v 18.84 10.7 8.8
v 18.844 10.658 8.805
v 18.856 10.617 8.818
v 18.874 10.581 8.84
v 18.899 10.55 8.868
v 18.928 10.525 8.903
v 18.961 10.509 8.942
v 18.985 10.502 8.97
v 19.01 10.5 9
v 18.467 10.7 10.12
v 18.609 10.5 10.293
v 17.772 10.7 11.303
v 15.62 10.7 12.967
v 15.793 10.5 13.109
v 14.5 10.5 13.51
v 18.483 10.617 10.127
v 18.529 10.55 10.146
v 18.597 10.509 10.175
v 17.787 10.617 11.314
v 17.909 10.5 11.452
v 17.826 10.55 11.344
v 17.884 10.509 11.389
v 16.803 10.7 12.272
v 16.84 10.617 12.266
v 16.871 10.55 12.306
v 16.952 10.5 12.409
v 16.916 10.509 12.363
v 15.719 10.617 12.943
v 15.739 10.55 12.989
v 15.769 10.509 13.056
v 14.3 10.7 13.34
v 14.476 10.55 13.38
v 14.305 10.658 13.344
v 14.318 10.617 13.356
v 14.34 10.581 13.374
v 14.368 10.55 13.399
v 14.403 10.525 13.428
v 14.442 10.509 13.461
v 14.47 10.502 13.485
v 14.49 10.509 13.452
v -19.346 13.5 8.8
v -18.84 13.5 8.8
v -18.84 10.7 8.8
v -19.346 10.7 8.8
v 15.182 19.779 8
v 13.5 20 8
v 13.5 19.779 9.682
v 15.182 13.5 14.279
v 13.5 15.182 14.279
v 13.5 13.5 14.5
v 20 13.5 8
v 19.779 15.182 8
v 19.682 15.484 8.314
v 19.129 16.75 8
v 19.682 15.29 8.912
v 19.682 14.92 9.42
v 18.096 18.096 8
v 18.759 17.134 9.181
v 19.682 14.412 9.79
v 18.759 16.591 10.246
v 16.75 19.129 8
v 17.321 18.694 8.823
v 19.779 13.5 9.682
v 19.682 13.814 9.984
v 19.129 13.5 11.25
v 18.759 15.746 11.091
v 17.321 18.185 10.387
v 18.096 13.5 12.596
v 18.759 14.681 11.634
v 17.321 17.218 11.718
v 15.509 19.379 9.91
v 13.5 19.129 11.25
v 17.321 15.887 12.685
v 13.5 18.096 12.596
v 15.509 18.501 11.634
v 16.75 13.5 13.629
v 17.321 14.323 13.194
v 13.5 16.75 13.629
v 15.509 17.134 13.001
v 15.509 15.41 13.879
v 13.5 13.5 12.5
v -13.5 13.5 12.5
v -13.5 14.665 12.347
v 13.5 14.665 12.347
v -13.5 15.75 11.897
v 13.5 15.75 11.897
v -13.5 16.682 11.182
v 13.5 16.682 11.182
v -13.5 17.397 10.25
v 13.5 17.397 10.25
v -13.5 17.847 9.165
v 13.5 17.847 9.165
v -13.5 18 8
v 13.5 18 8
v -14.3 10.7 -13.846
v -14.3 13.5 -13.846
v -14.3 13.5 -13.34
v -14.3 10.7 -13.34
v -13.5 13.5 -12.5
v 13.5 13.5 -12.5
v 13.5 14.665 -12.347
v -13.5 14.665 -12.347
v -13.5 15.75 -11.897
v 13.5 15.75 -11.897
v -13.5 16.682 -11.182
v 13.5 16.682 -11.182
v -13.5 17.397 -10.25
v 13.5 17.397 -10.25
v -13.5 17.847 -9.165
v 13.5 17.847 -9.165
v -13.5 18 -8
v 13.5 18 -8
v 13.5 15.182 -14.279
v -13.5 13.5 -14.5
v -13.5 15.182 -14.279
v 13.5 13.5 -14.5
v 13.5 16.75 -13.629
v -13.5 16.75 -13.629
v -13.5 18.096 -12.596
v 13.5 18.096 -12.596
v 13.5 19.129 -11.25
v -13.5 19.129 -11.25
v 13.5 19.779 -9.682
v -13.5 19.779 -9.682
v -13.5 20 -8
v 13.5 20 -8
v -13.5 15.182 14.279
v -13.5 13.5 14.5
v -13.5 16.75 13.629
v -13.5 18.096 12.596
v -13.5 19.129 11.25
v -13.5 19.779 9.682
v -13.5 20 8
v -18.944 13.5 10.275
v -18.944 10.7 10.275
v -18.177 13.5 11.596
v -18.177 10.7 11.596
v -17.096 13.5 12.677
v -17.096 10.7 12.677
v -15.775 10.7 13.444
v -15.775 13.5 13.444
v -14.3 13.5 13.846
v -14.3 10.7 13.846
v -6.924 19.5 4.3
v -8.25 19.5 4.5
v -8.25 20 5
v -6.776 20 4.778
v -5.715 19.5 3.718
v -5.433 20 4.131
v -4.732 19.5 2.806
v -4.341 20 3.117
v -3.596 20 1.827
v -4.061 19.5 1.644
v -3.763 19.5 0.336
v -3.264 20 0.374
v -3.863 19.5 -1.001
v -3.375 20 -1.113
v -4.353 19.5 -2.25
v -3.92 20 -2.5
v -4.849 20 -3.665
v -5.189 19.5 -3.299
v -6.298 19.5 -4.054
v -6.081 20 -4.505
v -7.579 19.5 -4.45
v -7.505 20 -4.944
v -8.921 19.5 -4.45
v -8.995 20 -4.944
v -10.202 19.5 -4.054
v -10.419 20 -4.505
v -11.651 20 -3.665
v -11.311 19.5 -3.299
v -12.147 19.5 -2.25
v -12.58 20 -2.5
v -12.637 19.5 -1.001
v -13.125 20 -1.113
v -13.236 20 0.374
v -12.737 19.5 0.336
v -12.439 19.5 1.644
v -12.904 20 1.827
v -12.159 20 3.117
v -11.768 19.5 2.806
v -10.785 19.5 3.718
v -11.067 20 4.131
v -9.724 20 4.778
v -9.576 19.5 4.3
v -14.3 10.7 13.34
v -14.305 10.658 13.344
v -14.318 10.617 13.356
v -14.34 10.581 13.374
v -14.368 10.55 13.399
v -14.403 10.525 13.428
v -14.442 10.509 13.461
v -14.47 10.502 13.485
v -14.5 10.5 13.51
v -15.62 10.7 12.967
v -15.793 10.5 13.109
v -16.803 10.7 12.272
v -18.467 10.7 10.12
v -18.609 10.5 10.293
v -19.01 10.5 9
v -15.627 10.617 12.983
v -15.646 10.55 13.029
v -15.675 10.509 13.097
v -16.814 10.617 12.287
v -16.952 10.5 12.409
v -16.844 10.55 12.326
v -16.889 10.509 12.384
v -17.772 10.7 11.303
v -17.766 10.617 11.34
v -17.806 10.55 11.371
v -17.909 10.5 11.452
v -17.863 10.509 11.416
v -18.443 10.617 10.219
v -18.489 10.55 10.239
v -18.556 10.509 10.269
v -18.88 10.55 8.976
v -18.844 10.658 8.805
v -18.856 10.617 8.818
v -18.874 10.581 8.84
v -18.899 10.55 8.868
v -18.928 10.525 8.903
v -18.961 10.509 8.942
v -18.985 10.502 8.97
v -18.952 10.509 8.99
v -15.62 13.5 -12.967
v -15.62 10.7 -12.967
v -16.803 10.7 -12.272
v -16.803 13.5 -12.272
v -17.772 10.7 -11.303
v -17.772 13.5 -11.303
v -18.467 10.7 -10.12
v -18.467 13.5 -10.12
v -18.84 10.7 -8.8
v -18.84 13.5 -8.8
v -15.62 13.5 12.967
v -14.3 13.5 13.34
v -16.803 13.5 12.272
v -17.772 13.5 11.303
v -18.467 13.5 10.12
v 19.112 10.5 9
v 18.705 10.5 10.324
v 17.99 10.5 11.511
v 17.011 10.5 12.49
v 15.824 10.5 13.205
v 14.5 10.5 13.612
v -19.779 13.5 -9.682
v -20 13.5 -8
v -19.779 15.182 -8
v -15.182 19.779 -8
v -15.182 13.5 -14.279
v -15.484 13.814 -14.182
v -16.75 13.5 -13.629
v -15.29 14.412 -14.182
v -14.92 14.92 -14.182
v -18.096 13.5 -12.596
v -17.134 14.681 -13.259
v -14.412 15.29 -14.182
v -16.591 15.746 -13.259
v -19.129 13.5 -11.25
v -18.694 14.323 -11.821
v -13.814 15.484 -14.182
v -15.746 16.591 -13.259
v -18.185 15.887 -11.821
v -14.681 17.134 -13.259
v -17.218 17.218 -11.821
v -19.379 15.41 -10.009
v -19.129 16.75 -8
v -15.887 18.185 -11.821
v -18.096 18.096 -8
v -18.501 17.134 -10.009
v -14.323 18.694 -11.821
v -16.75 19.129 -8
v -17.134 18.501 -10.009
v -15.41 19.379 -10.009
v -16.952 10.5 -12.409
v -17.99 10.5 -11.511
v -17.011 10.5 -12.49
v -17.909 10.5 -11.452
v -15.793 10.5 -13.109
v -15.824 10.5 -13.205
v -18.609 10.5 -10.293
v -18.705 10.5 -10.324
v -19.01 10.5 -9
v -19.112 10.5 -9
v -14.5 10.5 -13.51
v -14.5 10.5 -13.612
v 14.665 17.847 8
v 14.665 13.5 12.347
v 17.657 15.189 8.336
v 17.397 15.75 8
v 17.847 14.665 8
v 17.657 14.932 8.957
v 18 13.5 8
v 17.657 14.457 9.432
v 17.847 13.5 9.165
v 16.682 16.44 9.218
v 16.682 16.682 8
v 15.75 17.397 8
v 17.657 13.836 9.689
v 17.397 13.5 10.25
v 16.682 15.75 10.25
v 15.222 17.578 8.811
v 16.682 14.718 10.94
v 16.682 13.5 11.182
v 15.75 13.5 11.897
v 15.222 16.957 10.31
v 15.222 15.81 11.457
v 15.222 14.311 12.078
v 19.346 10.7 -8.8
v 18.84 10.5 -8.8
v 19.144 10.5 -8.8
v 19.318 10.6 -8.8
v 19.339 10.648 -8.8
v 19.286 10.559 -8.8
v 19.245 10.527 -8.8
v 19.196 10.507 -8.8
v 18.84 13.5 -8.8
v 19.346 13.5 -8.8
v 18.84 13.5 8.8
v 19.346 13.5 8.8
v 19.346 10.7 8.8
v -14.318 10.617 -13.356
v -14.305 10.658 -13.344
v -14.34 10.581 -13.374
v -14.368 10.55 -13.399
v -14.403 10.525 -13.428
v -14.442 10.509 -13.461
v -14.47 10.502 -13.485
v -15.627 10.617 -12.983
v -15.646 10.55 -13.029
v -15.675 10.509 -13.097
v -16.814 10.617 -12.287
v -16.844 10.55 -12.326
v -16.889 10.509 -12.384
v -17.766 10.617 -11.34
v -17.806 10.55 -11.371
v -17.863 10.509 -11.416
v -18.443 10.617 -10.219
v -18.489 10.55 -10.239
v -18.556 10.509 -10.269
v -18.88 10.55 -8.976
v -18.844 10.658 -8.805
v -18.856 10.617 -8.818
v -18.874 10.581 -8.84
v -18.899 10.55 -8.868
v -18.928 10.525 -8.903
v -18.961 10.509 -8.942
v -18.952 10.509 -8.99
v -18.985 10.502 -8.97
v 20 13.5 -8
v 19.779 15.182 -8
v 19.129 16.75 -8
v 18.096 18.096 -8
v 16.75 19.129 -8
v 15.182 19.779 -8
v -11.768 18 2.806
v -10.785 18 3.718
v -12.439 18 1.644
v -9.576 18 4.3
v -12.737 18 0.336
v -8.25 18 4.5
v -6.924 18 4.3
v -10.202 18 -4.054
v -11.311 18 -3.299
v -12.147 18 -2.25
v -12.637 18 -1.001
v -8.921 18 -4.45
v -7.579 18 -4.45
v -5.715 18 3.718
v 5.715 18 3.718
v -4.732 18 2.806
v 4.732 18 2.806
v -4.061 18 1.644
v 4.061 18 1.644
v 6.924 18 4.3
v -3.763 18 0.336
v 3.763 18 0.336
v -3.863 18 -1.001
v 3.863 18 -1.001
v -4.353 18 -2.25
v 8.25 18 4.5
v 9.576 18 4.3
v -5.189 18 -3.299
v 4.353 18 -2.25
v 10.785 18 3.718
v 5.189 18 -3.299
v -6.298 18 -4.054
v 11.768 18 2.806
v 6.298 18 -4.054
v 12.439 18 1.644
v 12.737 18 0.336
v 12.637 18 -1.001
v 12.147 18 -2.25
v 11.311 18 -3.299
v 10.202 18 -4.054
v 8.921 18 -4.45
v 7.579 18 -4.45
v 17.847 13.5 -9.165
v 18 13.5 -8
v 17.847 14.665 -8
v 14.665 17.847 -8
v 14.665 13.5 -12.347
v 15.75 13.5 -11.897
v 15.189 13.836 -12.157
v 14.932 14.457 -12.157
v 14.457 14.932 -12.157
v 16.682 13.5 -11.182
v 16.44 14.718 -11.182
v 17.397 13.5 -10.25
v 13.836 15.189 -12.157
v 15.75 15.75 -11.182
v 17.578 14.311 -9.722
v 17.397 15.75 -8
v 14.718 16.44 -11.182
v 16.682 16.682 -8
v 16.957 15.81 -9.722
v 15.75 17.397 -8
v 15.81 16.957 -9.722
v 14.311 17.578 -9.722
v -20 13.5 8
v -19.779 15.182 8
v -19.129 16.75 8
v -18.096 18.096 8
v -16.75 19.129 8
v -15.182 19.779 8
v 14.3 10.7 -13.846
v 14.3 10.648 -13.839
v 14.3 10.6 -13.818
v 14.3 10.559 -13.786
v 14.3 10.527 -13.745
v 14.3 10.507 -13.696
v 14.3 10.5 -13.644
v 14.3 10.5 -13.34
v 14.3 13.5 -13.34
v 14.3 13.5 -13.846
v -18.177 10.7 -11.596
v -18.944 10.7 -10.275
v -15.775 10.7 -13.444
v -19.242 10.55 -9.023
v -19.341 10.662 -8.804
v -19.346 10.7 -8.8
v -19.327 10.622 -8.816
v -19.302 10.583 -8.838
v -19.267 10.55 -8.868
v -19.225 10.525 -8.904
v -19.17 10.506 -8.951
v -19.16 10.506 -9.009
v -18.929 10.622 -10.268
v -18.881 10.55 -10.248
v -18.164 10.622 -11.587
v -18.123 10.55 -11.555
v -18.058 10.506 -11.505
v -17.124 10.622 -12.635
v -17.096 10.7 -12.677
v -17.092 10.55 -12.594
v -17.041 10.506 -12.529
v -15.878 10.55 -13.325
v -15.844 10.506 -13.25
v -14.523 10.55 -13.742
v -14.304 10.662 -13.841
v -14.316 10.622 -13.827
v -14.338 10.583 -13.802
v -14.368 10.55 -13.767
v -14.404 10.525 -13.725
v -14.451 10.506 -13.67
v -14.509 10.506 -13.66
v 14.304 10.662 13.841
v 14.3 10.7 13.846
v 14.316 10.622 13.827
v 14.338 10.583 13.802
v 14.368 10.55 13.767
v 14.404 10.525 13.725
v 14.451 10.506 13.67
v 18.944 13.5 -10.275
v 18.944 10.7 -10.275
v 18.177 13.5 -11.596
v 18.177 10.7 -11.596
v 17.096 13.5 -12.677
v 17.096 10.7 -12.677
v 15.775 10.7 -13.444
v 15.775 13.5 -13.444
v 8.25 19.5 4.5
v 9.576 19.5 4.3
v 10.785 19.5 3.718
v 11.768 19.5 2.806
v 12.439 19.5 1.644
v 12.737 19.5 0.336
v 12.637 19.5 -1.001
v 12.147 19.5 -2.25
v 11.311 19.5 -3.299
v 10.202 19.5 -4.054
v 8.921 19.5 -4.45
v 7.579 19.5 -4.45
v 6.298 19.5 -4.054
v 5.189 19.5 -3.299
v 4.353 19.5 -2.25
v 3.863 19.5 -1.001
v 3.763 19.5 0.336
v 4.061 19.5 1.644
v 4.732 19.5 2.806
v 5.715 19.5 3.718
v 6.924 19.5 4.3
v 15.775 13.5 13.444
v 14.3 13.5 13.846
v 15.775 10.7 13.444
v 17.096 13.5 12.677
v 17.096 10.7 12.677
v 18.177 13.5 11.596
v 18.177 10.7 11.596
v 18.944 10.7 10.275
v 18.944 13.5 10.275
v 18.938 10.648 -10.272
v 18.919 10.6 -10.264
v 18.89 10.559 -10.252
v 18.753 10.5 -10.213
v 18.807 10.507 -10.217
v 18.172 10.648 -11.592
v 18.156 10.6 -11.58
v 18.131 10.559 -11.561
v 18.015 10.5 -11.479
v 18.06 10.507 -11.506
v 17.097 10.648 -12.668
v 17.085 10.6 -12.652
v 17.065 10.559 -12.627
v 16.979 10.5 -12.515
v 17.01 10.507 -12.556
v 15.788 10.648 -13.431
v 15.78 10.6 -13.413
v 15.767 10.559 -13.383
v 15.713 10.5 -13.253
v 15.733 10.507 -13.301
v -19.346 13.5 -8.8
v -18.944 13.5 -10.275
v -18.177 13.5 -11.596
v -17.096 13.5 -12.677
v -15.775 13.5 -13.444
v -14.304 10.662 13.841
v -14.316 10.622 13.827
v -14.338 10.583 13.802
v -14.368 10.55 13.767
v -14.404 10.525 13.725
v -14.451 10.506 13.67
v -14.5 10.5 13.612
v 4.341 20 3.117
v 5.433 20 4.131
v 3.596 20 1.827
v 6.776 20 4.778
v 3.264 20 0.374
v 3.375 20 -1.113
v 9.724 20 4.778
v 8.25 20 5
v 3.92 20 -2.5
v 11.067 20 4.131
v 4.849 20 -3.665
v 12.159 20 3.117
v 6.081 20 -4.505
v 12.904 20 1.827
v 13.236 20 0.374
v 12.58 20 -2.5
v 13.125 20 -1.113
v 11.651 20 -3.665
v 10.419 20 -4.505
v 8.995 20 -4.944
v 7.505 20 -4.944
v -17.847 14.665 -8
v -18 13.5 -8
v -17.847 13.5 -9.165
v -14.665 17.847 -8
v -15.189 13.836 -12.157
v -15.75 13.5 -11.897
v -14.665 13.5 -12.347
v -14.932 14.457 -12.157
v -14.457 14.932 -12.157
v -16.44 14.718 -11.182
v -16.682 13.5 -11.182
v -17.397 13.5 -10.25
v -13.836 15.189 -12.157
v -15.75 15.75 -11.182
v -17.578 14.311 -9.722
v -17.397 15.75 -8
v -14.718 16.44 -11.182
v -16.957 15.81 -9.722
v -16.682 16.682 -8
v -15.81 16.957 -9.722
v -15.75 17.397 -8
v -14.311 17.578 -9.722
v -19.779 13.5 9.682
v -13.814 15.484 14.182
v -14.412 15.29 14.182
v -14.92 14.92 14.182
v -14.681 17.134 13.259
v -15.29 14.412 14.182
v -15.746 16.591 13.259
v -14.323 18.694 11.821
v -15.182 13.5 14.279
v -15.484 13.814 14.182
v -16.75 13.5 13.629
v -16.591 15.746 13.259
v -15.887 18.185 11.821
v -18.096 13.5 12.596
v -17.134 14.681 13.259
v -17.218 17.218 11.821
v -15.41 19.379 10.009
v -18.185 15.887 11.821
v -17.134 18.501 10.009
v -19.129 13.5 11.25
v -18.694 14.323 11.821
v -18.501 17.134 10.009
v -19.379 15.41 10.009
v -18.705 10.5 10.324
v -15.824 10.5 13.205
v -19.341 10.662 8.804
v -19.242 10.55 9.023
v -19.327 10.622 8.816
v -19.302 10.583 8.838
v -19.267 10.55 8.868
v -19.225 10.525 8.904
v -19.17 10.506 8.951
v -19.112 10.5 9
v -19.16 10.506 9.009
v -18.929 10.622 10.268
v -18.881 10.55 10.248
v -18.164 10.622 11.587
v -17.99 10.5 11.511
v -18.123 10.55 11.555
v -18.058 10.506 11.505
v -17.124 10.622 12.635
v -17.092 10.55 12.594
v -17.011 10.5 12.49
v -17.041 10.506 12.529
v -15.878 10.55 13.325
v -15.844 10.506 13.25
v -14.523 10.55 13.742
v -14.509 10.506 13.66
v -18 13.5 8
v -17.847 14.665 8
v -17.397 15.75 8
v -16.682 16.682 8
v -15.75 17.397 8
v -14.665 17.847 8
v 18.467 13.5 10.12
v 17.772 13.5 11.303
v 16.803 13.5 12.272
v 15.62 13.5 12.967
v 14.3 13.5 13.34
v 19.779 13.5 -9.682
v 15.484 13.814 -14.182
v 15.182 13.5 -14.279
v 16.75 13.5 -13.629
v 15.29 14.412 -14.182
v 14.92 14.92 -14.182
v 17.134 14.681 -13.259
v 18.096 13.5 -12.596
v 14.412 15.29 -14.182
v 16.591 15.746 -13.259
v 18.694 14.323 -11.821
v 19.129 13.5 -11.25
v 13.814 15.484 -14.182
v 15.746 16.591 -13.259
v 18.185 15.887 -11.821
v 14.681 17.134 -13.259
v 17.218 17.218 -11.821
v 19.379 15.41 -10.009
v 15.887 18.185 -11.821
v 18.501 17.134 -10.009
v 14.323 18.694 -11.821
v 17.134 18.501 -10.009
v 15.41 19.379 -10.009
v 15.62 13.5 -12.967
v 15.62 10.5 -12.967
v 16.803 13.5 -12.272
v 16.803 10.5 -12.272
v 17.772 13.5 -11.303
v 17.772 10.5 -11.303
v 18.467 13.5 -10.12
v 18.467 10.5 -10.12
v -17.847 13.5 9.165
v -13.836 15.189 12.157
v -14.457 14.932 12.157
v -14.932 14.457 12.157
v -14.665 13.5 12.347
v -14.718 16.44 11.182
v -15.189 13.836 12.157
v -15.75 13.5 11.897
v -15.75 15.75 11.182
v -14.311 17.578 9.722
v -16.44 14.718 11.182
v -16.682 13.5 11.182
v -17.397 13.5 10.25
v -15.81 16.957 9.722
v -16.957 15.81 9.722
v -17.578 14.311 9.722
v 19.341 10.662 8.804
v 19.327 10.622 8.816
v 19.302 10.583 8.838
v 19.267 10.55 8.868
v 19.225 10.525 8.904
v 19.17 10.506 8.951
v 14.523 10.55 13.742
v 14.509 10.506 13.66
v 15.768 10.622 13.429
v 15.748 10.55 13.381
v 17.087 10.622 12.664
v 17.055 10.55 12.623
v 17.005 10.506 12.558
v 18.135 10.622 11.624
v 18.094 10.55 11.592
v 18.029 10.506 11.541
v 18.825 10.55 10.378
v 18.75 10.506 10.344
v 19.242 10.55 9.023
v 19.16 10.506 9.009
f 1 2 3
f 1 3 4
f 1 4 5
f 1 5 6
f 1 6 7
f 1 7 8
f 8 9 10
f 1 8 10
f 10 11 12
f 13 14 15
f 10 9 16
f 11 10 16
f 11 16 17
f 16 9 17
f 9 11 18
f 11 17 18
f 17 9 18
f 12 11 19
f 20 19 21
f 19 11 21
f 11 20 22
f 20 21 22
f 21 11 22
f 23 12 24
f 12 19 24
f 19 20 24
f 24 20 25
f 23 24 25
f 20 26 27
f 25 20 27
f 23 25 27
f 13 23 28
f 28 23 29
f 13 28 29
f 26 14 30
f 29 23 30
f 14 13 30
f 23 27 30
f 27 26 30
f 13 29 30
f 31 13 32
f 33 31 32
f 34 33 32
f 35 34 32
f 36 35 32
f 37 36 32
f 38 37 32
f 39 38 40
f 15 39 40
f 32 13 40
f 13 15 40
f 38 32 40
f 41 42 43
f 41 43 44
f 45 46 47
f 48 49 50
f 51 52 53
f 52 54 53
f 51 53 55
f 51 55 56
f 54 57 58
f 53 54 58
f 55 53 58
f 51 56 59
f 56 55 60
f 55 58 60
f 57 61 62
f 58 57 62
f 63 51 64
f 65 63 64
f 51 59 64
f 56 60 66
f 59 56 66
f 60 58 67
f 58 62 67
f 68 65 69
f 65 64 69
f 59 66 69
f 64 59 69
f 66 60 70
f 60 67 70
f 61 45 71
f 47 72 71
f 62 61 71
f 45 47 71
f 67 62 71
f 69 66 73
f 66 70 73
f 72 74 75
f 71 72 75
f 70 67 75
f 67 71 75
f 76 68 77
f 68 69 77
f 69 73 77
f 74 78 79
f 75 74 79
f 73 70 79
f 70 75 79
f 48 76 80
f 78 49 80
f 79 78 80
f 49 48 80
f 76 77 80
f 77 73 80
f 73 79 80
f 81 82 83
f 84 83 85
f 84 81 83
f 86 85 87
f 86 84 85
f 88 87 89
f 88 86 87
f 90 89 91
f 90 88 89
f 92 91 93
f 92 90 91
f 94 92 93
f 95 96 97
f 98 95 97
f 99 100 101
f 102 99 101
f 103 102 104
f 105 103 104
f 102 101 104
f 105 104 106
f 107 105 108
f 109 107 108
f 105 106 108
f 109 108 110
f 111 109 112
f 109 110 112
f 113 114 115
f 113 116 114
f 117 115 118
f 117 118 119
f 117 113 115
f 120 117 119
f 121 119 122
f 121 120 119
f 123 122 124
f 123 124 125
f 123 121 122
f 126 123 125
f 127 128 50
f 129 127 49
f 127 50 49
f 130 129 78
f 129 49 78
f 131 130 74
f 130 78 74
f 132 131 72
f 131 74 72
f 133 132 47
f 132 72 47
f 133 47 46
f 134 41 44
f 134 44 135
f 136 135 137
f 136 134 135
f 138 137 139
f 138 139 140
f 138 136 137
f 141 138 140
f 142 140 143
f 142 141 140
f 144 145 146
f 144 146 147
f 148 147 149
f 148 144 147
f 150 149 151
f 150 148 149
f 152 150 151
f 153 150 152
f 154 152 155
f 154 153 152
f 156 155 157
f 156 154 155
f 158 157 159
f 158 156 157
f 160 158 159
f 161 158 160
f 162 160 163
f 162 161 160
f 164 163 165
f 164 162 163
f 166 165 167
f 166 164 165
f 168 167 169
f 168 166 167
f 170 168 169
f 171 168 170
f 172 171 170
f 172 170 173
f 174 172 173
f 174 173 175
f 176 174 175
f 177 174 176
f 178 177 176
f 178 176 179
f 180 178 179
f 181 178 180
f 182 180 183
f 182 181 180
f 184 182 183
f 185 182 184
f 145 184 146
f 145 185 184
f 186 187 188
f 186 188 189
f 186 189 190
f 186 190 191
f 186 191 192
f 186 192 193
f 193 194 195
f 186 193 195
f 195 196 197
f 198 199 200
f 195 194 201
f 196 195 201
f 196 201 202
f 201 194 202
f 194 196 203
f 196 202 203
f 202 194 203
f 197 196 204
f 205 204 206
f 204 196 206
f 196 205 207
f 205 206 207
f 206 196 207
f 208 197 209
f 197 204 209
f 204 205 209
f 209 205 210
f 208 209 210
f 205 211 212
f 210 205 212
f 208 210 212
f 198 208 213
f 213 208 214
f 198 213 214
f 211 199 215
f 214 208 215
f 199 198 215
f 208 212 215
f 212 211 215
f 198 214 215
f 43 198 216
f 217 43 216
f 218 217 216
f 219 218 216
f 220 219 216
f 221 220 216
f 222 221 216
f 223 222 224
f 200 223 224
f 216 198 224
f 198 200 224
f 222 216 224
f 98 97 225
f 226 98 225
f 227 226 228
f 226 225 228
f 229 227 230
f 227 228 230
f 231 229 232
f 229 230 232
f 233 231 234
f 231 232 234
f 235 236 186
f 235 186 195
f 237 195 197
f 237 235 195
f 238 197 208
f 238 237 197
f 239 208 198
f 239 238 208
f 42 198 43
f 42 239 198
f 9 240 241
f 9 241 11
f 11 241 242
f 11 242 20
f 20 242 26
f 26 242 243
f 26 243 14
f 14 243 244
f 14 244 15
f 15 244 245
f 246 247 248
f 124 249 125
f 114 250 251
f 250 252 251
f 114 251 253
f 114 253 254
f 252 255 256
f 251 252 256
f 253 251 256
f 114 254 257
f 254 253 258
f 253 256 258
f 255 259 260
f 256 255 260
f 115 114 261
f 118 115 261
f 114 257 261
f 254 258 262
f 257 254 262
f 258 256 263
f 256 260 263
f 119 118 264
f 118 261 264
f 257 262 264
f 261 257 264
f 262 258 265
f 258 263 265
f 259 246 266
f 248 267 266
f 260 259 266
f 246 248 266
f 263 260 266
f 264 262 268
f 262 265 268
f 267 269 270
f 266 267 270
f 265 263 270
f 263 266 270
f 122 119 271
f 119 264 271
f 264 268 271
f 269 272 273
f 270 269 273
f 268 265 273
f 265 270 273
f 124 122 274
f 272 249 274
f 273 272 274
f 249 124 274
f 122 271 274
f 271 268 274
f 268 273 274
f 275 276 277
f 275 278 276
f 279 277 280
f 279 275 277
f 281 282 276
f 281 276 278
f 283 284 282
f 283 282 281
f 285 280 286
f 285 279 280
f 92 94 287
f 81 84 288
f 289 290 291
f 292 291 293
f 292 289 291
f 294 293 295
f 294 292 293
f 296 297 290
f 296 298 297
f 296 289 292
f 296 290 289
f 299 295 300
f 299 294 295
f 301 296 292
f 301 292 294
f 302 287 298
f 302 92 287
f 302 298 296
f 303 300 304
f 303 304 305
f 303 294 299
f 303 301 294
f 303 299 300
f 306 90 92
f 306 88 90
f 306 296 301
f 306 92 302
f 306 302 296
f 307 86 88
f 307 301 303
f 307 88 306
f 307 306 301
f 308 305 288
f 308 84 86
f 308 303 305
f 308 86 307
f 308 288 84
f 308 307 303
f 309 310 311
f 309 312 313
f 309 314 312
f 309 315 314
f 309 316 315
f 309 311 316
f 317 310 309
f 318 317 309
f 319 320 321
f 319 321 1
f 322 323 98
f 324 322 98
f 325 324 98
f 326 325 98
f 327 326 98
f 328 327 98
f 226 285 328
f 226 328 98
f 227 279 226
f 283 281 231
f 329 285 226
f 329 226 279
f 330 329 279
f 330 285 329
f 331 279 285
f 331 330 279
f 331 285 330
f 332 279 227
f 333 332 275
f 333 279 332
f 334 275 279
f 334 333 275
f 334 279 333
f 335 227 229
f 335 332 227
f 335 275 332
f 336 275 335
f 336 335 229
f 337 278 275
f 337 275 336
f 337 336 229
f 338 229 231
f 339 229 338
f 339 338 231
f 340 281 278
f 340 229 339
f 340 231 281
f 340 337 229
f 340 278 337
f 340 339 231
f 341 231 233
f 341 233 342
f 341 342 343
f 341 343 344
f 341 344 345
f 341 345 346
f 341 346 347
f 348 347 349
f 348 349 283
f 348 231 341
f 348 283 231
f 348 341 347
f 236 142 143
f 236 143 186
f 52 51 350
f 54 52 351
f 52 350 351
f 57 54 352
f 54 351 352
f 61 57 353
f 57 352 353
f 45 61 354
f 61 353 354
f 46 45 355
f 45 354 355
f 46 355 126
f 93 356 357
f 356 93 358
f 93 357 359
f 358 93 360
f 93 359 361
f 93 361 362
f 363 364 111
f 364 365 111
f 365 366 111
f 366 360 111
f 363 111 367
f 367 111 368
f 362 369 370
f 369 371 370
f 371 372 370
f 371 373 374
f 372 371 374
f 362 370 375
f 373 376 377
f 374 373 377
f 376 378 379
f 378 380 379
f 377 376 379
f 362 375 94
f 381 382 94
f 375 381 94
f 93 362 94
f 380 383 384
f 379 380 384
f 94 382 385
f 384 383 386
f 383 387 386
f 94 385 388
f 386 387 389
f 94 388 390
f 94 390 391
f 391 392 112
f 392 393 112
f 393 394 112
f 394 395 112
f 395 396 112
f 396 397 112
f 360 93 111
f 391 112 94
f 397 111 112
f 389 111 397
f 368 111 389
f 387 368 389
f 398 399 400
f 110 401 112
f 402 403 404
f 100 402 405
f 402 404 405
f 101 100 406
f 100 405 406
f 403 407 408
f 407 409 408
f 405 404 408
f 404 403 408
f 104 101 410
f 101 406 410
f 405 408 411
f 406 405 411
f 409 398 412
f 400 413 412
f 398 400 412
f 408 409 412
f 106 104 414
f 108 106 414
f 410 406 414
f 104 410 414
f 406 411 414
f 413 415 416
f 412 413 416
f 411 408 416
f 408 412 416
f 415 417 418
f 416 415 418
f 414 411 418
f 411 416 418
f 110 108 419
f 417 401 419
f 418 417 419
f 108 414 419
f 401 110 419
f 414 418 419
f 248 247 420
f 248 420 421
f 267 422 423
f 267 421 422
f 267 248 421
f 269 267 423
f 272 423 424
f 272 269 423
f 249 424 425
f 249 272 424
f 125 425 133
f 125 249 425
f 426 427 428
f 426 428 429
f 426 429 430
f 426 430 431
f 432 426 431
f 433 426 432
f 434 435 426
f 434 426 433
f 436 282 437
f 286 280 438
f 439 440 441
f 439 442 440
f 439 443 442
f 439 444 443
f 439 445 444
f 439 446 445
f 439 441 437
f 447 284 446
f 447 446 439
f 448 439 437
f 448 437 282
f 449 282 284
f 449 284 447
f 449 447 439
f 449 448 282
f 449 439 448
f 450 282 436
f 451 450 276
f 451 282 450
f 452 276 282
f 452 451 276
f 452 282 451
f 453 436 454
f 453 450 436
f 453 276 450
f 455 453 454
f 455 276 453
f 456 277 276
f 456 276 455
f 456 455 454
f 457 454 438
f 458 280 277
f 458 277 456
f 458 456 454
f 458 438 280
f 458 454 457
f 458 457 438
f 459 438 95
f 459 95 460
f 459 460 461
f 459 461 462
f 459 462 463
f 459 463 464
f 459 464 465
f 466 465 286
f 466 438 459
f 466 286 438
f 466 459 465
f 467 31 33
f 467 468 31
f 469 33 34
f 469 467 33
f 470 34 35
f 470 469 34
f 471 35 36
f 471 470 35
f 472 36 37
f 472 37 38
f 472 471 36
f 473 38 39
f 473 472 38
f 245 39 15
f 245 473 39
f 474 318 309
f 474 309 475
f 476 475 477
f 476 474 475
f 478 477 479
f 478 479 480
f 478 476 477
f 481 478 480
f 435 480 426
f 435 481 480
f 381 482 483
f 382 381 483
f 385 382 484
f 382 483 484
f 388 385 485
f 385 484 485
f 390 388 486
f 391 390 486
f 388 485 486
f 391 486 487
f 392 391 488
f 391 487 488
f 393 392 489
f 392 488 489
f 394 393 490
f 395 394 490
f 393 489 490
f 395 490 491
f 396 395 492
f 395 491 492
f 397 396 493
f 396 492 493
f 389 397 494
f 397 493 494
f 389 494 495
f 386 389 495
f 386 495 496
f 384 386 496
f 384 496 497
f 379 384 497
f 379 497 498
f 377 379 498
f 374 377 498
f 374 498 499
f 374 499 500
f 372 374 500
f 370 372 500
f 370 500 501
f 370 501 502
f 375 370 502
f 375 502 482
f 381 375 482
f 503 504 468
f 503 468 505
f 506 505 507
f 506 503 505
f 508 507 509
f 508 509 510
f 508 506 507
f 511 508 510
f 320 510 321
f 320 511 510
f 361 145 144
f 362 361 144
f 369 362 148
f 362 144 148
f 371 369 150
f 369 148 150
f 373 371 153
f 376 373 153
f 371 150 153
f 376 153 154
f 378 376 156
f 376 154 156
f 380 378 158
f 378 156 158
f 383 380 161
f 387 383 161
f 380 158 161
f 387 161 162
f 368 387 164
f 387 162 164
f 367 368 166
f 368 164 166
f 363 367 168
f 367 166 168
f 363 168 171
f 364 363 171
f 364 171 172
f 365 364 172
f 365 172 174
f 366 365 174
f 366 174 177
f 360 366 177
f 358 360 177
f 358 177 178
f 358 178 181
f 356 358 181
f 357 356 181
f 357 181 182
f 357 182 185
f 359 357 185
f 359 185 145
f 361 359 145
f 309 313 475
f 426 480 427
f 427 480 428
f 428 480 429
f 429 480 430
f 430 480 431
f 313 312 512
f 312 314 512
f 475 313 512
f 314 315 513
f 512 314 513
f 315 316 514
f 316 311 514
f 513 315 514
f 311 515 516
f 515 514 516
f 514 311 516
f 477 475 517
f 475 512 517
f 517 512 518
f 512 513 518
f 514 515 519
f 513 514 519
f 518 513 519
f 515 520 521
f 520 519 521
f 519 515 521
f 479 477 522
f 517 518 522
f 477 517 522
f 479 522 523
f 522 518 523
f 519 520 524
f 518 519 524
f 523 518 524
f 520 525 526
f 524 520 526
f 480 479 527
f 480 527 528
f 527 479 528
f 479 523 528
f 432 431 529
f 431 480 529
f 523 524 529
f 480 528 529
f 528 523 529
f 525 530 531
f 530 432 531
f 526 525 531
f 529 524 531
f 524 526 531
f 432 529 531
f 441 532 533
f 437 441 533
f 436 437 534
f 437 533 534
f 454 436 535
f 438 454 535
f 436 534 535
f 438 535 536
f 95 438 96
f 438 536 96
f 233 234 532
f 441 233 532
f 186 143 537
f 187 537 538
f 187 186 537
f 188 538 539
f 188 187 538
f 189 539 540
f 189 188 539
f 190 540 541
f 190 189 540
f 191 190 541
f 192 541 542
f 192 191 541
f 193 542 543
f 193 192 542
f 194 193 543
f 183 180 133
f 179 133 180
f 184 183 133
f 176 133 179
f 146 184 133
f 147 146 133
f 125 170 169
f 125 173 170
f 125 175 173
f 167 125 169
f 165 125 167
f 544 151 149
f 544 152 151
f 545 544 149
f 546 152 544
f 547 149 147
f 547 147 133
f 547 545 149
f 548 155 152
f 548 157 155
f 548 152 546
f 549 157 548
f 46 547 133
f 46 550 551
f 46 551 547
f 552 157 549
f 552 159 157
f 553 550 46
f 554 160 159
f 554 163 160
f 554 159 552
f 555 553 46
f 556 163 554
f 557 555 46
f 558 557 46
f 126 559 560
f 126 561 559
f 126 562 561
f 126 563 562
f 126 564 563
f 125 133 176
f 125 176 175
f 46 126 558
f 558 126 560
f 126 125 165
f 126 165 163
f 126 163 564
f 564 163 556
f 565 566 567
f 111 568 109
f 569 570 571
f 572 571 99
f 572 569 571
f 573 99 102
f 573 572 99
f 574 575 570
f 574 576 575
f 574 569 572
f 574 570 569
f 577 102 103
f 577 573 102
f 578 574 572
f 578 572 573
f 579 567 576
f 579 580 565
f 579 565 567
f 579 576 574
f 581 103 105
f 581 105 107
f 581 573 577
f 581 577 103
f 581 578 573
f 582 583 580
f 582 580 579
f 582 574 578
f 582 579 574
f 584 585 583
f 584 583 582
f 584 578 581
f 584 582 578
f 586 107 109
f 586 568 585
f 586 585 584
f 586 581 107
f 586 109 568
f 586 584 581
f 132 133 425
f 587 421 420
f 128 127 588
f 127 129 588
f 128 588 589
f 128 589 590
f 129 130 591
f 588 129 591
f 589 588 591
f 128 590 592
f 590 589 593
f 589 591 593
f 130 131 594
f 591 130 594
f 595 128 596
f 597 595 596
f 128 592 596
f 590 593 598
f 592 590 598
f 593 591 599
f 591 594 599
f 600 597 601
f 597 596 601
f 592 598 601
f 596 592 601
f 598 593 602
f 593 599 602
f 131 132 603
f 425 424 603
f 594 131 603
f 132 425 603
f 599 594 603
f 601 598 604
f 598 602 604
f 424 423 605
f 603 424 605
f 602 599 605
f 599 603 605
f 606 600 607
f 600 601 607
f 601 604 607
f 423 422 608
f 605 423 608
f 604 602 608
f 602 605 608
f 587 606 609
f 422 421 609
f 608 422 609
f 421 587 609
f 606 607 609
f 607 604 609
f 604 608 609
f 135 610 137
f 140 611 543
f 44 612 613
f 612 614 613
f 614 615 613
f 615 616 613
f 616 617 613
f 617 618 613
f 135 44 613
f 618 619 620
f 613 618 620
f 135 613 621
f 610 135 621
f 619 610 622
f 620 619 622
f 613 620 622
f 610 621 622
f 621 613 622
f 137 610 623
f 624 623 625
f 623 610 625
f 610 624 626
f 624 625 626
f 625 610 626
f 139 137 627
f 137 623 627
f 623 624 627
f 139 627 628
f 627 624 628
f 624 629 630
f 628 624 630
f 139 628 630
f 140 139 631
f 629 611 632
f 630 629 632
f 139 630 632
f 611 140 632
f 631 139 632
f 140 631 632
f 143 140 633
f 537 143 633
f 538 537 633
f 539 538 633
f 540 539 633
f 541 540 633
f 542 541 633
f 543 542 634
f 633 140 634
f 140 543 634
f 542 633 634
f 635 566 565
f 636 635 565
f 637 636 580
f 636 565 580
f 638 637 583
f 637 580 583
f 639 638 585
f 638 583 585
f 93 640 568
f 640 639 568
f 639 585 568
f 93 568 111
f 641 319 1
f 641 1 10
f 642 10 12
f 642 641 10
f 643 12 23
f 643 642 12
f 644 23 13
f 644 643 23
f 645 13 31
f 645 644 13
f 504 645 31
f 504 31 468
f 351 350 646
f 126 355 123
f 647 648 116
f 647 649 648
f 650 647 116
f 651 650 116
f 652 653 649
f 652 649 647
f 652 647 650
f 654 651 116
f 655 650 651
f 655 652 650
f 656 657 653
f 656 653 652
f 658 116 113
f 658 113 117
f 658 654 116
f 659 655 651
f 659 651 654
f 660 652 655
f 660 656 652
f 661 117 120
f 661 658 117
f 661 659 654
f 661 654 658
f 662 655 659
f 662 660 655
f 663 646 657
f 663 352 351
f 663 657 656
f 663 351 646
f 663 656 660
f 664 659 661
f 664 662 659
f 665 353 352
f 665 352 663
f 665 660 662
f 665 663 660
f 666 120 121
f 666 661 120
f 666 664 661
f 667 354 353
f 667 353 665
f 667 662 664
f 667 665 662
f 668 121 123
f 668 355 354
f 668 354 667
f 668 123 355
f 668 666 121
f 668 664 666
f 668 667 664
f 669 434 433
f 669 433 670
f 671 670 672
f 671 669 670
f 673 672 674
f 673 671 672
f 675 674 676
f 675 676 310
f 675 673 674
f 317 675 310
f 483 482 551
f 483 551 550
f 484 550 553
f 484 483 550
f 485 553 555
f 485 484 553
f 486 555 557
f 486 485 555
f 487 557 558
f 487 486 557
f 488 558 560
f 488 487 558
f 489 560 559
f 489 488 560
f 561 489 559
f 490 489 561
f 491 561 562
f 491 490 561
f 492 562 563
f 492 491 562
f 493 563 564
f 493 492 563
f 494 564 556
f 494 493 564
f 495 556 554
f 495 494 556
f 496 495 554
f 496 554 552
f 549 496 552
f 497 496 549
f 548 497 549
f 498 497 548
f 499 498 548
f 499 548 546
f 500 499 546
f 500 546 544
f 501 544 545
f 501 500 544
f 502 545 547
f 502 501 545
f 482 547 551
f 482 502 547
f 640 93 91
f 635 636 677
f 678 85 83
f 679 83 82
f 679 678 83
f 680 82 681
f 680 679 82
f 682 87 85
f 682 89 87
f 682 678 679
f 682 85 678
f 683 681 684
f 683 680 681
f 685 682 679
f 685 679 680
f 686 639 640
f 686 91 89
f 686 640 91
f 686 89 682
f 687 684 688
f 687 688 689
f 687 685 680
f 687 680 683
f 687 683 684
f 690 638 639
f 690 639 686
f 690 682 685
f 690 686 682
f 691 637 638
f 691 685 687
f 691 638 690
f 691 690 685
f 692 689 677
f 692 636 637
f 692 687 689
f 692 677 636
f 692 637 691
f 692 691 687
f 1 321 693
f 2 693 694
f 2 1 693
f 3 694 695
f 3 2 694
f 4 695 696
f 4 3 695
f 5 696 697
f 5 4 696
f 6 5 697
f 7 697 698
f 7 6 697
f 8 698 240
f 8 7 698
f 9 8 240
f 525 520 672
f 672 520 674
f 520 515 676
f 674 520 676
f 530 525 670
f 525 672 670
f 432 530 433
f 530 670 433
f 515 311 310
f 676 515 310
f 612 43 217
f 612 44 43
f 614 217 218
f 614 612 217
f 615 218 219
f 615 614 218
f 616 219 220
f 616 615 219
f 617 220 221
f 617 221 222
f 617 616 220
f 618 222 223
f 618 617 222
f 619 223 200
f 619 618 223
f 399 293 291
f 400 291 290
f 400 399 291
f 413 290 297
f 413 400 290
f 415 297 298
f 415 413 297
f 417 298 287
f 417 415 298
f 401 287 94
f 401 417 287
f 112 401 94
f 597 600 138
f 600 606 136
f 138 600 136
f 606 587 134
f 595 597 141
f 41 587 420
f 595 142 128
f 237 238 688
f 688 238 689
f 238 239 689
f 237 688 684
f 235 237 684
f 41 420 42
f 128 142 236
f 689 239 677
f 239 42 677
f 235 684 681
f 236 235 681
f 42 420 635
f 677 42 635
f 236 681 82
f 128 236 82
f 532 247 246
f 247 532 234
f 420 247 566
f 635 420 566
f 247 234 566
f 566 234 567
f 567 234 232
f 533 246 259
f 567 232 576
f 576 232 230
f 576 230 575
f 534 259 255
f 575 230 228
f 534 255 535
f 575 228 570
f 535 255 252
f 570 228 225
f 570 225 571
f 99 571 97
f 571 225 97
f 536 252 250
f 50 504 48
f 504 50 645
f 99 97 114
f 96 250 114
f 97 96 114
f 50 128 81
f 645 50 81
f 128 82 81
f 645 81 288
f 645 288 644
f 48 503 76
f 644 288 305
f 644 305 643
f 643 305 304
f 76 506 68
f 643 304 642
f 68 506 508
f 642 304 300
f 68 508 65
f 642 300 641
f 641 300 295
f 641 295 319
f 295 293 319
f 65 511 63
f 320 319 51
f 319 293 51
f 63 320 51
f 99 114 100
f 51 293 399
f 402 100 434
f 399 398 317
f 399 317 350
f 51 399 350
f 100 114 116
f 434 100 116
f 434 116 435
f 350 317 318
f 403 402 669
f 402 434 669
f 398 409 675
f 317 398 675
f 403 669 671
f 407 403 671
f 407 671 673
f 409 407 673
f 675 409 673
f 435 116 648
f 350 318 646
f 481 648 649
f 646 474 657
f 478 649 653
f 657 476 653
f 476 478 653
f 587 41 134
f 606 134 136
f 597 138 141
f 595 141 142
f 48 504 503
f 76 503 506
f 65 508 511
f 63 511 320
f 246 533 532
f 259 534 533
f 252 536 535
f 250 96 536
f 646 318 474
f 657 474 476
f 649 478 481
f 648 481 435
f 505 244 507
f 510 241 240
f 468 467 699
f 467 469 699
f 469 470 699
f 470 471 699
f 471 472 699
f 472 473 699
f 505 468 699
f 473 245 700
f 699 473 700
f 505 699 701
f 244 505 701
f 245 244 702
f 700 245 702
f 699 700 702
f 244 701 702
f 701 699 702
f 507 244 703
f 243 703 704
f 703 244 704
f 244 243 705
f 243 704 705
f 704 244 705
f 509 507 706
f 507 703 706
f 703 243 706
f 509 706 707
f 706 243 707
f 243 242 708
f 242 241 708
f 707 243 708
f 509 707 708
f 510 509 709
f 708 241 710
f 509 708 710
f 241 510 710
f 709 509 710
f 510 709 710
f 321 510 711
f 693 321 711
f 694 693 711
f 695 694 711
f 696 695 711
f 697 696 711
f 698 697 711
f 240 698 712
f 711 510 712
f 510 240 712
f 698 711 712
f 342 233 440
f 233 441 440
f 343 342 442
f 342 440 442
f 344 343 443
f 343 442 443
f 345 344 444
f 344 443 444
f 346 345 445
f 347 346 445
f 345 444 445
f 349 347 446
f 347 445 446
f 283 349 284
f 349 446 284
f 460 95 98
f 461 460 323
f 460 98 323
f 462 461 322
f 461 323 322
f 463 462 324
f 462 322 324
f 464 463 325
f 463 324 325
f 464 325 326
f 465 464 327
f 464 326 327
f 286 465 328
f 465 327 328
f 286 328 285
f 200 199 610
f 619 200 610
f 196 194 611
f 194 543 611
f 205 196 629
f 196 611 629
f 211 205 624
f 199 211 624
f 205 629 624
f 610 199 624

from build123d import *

# Parameters (mm, degrees)
SKETCH1_W           = 40
SKETCH1_H           = 29
BOSS_EXTRUDE1_DEPTH = 20
FILLET2_R           = 6.5
SKETCH3_W           = 48.982601016
SKETCH3_H           = 39.309165856
CUT_EXTRUDE1_DEPTH  = 14.5
SHELL1_T            = -2
BOSS_EXTRUDE3_DEPTH = 3
FILLET3_R           = 0.2
SKETCH6_R           = 4.5
CUT_EXTRUDE2_DEPTH  = 10.5000001
CHAMFER1_SIZE       = 0.5


with BuildPart() as part:
    # Sketch1 → Boss-Extrude1 (new body)
    with BuildSketch(Plane(origin=(0, 0, 0), x_dir=(1, 0, 0), z_dir=(0, 1, 0))):
        Rectangle(SKETCH1_W, SKETCH1_H)
    extrude(amount=BOSS_EXTRUDE1_DEPTH)

    # Fillet2
    fillet2_edges = [part.edges().sort_by_distance(p)[0] for p in [
        (-20, 20, 0),
        (0, 20, 14.5),
        (20, 20, 0),
        (0, 0, 14.5),
        (-20, 0, 0),
        (0, 0, -14.5),
        (20, 0, 0),
        (20, 10, 14.5),
        (-20, 10, 14.5),
        (-20, 10, -14.5),
        (20, 10, -14.5),
        (0, 20, -14.5),
    ]]
    fillet(fillet2_edges, radius=FILLET2_R)

    # Sketch3 → Cut-Extrude1 (cut, through all)
    with BuildSketch(Plane(origin=(0, 13.5, 0), x_dir=(1, 0, 0), z_dir=(0, 1, 0))):
        Rectangle(SKETCH3_W, SKETCH3_H)
    extrude(amount=-CUT_EXTRUDE1_DEPTH, mode=Mode.SUBTRACT)

    # Shell1
    shell1_openings = [part.faces().sort_by_distance(p)[0] for p in [
        (0, 13.5, 0),
    ]]
    offset(amount=SHELL1_T, openings=shell1_openings)

    # Sketch5 → Boss-Extrude3 (add)
    with BuildSketch(Plane.XZ.offset(-13.5)):
        with BuildLine():
            Line((-14.3, 13.845511098), (-14.3, 13.340411969))
            ThreePointArc((-14.3, 13.340411969), (-17.318376618, 11.818376618), (-18.840411969, 8.8))
            Line((-18.840411969, 8.8), (-19.345511098, 8.8))
            ThreePointArc((-19.345511098, 8.8), (-17.671930009, 12.171930009), (-14.3, 13.845511098))
        make_face()
        with BuildLine():
            Line((-14.3, -13.845511098), (-14.3, -13.340411969))
            ThreePointArc((-14.3, -13.340411969), (-17.318376618, -11.818376618), (-18.840411969, -8.8))
            Line((-18.840411969, -8.8), (-19.345511098, -8.8))
            ThreePointArc((-19.345511098, -8.8), (-17.671930009, -12.171930009), (-14.3, -13.845511098))
        make_face()
        with BuildLine():
            Line((14.3, -13.845511098), (14.3, -13.340411969))
            ThreePointArc((14.3, -13.340411969), (17.318376618, -11.818376618), (18.840411969, -8.8))
            Line((18.840411969, -8.8), (19.345511098, -8.8))
            ThreePointArc((19.345511098, -8.8), (17.671930009, -12.171930009), (14.3, -13.845511098))
        make_face()
        with BuildLine():
            Line((19.345511098, 8.8), (18.840411969, 8.8))
            ThreePointArc((18.840411969, 8.8), (17.318376618, 11.818376618), (14.3, 13.340411969))
            Line((14.3, 13.340411969), (14.3, 13.845511098))
            ThreePointArc((14.3, 13.845511098), (17.671930009, 12.171930009), (19.345511098, 8.8))
        make_face()
    extrude(amount=BOSS_EXTRUDE3_DEPTH)

    # Fillet3
    fillet3_edges = [part.edges().sort_by_distance(p)[0] for p in [
        (-17.318376618, 10.5, 11.818376618),
        (-17.671930009, 10.5, 12.171930009),
        (-17.318376618, 10.5, -11.818376618),
        (-17.671930009, 10.5, -12.171930009),
        (17.318376618, 10.5, 11.818376618),
        (17.671930009, 10.5, 12.171930009),
        (17.671930009, 10.5, -12.171930009),
        (-14.3, 10.5, 13.592961534),
        (-19.092961534, 10.5, 8.8),
        (-19.092961534, 10.5, -8.8),
        (-14.3, 10.5, -13.592961534),
        (19.092961534, 10.5, 8.8),
        (14.3, 10.5, 13.592961534),
    ]]
    fillet(fillet3_edges, radius=FILLET3_R)

    # Sketch6 → Cut-Extrude2 (cut, through all)
    with BuildSketch(Plane(origin=(0, 20, 0), x_dir=(1, 0, 0), z_dir=(0, 1, 0))):
        with Locations(Location((-8.25, 0, 0), (0, 0, 270))):  # turned: the seam where the file's is
            Circle(SKETCH6_R)
        with Locations(Location((8.25, 0, 0), (0, 0, 270))):  # turned: the seam where the file's is
            Circle(SKETCH6_R)
    extrude(amount=-CUT_EXTRUDE2_DEPTH, mode=Mode.SUBTRACT)

    # Chamfer1
    chamfer1_edges = [part.edges().sort_by_distance(p)[0] for p in [
        (-8.25, 20, -4.5),
        (8.25, 20, -4.5),
    ]]
    chamfer(chamfer1_edges, length=CHAMFER1_SIZE)


solid = part.part
